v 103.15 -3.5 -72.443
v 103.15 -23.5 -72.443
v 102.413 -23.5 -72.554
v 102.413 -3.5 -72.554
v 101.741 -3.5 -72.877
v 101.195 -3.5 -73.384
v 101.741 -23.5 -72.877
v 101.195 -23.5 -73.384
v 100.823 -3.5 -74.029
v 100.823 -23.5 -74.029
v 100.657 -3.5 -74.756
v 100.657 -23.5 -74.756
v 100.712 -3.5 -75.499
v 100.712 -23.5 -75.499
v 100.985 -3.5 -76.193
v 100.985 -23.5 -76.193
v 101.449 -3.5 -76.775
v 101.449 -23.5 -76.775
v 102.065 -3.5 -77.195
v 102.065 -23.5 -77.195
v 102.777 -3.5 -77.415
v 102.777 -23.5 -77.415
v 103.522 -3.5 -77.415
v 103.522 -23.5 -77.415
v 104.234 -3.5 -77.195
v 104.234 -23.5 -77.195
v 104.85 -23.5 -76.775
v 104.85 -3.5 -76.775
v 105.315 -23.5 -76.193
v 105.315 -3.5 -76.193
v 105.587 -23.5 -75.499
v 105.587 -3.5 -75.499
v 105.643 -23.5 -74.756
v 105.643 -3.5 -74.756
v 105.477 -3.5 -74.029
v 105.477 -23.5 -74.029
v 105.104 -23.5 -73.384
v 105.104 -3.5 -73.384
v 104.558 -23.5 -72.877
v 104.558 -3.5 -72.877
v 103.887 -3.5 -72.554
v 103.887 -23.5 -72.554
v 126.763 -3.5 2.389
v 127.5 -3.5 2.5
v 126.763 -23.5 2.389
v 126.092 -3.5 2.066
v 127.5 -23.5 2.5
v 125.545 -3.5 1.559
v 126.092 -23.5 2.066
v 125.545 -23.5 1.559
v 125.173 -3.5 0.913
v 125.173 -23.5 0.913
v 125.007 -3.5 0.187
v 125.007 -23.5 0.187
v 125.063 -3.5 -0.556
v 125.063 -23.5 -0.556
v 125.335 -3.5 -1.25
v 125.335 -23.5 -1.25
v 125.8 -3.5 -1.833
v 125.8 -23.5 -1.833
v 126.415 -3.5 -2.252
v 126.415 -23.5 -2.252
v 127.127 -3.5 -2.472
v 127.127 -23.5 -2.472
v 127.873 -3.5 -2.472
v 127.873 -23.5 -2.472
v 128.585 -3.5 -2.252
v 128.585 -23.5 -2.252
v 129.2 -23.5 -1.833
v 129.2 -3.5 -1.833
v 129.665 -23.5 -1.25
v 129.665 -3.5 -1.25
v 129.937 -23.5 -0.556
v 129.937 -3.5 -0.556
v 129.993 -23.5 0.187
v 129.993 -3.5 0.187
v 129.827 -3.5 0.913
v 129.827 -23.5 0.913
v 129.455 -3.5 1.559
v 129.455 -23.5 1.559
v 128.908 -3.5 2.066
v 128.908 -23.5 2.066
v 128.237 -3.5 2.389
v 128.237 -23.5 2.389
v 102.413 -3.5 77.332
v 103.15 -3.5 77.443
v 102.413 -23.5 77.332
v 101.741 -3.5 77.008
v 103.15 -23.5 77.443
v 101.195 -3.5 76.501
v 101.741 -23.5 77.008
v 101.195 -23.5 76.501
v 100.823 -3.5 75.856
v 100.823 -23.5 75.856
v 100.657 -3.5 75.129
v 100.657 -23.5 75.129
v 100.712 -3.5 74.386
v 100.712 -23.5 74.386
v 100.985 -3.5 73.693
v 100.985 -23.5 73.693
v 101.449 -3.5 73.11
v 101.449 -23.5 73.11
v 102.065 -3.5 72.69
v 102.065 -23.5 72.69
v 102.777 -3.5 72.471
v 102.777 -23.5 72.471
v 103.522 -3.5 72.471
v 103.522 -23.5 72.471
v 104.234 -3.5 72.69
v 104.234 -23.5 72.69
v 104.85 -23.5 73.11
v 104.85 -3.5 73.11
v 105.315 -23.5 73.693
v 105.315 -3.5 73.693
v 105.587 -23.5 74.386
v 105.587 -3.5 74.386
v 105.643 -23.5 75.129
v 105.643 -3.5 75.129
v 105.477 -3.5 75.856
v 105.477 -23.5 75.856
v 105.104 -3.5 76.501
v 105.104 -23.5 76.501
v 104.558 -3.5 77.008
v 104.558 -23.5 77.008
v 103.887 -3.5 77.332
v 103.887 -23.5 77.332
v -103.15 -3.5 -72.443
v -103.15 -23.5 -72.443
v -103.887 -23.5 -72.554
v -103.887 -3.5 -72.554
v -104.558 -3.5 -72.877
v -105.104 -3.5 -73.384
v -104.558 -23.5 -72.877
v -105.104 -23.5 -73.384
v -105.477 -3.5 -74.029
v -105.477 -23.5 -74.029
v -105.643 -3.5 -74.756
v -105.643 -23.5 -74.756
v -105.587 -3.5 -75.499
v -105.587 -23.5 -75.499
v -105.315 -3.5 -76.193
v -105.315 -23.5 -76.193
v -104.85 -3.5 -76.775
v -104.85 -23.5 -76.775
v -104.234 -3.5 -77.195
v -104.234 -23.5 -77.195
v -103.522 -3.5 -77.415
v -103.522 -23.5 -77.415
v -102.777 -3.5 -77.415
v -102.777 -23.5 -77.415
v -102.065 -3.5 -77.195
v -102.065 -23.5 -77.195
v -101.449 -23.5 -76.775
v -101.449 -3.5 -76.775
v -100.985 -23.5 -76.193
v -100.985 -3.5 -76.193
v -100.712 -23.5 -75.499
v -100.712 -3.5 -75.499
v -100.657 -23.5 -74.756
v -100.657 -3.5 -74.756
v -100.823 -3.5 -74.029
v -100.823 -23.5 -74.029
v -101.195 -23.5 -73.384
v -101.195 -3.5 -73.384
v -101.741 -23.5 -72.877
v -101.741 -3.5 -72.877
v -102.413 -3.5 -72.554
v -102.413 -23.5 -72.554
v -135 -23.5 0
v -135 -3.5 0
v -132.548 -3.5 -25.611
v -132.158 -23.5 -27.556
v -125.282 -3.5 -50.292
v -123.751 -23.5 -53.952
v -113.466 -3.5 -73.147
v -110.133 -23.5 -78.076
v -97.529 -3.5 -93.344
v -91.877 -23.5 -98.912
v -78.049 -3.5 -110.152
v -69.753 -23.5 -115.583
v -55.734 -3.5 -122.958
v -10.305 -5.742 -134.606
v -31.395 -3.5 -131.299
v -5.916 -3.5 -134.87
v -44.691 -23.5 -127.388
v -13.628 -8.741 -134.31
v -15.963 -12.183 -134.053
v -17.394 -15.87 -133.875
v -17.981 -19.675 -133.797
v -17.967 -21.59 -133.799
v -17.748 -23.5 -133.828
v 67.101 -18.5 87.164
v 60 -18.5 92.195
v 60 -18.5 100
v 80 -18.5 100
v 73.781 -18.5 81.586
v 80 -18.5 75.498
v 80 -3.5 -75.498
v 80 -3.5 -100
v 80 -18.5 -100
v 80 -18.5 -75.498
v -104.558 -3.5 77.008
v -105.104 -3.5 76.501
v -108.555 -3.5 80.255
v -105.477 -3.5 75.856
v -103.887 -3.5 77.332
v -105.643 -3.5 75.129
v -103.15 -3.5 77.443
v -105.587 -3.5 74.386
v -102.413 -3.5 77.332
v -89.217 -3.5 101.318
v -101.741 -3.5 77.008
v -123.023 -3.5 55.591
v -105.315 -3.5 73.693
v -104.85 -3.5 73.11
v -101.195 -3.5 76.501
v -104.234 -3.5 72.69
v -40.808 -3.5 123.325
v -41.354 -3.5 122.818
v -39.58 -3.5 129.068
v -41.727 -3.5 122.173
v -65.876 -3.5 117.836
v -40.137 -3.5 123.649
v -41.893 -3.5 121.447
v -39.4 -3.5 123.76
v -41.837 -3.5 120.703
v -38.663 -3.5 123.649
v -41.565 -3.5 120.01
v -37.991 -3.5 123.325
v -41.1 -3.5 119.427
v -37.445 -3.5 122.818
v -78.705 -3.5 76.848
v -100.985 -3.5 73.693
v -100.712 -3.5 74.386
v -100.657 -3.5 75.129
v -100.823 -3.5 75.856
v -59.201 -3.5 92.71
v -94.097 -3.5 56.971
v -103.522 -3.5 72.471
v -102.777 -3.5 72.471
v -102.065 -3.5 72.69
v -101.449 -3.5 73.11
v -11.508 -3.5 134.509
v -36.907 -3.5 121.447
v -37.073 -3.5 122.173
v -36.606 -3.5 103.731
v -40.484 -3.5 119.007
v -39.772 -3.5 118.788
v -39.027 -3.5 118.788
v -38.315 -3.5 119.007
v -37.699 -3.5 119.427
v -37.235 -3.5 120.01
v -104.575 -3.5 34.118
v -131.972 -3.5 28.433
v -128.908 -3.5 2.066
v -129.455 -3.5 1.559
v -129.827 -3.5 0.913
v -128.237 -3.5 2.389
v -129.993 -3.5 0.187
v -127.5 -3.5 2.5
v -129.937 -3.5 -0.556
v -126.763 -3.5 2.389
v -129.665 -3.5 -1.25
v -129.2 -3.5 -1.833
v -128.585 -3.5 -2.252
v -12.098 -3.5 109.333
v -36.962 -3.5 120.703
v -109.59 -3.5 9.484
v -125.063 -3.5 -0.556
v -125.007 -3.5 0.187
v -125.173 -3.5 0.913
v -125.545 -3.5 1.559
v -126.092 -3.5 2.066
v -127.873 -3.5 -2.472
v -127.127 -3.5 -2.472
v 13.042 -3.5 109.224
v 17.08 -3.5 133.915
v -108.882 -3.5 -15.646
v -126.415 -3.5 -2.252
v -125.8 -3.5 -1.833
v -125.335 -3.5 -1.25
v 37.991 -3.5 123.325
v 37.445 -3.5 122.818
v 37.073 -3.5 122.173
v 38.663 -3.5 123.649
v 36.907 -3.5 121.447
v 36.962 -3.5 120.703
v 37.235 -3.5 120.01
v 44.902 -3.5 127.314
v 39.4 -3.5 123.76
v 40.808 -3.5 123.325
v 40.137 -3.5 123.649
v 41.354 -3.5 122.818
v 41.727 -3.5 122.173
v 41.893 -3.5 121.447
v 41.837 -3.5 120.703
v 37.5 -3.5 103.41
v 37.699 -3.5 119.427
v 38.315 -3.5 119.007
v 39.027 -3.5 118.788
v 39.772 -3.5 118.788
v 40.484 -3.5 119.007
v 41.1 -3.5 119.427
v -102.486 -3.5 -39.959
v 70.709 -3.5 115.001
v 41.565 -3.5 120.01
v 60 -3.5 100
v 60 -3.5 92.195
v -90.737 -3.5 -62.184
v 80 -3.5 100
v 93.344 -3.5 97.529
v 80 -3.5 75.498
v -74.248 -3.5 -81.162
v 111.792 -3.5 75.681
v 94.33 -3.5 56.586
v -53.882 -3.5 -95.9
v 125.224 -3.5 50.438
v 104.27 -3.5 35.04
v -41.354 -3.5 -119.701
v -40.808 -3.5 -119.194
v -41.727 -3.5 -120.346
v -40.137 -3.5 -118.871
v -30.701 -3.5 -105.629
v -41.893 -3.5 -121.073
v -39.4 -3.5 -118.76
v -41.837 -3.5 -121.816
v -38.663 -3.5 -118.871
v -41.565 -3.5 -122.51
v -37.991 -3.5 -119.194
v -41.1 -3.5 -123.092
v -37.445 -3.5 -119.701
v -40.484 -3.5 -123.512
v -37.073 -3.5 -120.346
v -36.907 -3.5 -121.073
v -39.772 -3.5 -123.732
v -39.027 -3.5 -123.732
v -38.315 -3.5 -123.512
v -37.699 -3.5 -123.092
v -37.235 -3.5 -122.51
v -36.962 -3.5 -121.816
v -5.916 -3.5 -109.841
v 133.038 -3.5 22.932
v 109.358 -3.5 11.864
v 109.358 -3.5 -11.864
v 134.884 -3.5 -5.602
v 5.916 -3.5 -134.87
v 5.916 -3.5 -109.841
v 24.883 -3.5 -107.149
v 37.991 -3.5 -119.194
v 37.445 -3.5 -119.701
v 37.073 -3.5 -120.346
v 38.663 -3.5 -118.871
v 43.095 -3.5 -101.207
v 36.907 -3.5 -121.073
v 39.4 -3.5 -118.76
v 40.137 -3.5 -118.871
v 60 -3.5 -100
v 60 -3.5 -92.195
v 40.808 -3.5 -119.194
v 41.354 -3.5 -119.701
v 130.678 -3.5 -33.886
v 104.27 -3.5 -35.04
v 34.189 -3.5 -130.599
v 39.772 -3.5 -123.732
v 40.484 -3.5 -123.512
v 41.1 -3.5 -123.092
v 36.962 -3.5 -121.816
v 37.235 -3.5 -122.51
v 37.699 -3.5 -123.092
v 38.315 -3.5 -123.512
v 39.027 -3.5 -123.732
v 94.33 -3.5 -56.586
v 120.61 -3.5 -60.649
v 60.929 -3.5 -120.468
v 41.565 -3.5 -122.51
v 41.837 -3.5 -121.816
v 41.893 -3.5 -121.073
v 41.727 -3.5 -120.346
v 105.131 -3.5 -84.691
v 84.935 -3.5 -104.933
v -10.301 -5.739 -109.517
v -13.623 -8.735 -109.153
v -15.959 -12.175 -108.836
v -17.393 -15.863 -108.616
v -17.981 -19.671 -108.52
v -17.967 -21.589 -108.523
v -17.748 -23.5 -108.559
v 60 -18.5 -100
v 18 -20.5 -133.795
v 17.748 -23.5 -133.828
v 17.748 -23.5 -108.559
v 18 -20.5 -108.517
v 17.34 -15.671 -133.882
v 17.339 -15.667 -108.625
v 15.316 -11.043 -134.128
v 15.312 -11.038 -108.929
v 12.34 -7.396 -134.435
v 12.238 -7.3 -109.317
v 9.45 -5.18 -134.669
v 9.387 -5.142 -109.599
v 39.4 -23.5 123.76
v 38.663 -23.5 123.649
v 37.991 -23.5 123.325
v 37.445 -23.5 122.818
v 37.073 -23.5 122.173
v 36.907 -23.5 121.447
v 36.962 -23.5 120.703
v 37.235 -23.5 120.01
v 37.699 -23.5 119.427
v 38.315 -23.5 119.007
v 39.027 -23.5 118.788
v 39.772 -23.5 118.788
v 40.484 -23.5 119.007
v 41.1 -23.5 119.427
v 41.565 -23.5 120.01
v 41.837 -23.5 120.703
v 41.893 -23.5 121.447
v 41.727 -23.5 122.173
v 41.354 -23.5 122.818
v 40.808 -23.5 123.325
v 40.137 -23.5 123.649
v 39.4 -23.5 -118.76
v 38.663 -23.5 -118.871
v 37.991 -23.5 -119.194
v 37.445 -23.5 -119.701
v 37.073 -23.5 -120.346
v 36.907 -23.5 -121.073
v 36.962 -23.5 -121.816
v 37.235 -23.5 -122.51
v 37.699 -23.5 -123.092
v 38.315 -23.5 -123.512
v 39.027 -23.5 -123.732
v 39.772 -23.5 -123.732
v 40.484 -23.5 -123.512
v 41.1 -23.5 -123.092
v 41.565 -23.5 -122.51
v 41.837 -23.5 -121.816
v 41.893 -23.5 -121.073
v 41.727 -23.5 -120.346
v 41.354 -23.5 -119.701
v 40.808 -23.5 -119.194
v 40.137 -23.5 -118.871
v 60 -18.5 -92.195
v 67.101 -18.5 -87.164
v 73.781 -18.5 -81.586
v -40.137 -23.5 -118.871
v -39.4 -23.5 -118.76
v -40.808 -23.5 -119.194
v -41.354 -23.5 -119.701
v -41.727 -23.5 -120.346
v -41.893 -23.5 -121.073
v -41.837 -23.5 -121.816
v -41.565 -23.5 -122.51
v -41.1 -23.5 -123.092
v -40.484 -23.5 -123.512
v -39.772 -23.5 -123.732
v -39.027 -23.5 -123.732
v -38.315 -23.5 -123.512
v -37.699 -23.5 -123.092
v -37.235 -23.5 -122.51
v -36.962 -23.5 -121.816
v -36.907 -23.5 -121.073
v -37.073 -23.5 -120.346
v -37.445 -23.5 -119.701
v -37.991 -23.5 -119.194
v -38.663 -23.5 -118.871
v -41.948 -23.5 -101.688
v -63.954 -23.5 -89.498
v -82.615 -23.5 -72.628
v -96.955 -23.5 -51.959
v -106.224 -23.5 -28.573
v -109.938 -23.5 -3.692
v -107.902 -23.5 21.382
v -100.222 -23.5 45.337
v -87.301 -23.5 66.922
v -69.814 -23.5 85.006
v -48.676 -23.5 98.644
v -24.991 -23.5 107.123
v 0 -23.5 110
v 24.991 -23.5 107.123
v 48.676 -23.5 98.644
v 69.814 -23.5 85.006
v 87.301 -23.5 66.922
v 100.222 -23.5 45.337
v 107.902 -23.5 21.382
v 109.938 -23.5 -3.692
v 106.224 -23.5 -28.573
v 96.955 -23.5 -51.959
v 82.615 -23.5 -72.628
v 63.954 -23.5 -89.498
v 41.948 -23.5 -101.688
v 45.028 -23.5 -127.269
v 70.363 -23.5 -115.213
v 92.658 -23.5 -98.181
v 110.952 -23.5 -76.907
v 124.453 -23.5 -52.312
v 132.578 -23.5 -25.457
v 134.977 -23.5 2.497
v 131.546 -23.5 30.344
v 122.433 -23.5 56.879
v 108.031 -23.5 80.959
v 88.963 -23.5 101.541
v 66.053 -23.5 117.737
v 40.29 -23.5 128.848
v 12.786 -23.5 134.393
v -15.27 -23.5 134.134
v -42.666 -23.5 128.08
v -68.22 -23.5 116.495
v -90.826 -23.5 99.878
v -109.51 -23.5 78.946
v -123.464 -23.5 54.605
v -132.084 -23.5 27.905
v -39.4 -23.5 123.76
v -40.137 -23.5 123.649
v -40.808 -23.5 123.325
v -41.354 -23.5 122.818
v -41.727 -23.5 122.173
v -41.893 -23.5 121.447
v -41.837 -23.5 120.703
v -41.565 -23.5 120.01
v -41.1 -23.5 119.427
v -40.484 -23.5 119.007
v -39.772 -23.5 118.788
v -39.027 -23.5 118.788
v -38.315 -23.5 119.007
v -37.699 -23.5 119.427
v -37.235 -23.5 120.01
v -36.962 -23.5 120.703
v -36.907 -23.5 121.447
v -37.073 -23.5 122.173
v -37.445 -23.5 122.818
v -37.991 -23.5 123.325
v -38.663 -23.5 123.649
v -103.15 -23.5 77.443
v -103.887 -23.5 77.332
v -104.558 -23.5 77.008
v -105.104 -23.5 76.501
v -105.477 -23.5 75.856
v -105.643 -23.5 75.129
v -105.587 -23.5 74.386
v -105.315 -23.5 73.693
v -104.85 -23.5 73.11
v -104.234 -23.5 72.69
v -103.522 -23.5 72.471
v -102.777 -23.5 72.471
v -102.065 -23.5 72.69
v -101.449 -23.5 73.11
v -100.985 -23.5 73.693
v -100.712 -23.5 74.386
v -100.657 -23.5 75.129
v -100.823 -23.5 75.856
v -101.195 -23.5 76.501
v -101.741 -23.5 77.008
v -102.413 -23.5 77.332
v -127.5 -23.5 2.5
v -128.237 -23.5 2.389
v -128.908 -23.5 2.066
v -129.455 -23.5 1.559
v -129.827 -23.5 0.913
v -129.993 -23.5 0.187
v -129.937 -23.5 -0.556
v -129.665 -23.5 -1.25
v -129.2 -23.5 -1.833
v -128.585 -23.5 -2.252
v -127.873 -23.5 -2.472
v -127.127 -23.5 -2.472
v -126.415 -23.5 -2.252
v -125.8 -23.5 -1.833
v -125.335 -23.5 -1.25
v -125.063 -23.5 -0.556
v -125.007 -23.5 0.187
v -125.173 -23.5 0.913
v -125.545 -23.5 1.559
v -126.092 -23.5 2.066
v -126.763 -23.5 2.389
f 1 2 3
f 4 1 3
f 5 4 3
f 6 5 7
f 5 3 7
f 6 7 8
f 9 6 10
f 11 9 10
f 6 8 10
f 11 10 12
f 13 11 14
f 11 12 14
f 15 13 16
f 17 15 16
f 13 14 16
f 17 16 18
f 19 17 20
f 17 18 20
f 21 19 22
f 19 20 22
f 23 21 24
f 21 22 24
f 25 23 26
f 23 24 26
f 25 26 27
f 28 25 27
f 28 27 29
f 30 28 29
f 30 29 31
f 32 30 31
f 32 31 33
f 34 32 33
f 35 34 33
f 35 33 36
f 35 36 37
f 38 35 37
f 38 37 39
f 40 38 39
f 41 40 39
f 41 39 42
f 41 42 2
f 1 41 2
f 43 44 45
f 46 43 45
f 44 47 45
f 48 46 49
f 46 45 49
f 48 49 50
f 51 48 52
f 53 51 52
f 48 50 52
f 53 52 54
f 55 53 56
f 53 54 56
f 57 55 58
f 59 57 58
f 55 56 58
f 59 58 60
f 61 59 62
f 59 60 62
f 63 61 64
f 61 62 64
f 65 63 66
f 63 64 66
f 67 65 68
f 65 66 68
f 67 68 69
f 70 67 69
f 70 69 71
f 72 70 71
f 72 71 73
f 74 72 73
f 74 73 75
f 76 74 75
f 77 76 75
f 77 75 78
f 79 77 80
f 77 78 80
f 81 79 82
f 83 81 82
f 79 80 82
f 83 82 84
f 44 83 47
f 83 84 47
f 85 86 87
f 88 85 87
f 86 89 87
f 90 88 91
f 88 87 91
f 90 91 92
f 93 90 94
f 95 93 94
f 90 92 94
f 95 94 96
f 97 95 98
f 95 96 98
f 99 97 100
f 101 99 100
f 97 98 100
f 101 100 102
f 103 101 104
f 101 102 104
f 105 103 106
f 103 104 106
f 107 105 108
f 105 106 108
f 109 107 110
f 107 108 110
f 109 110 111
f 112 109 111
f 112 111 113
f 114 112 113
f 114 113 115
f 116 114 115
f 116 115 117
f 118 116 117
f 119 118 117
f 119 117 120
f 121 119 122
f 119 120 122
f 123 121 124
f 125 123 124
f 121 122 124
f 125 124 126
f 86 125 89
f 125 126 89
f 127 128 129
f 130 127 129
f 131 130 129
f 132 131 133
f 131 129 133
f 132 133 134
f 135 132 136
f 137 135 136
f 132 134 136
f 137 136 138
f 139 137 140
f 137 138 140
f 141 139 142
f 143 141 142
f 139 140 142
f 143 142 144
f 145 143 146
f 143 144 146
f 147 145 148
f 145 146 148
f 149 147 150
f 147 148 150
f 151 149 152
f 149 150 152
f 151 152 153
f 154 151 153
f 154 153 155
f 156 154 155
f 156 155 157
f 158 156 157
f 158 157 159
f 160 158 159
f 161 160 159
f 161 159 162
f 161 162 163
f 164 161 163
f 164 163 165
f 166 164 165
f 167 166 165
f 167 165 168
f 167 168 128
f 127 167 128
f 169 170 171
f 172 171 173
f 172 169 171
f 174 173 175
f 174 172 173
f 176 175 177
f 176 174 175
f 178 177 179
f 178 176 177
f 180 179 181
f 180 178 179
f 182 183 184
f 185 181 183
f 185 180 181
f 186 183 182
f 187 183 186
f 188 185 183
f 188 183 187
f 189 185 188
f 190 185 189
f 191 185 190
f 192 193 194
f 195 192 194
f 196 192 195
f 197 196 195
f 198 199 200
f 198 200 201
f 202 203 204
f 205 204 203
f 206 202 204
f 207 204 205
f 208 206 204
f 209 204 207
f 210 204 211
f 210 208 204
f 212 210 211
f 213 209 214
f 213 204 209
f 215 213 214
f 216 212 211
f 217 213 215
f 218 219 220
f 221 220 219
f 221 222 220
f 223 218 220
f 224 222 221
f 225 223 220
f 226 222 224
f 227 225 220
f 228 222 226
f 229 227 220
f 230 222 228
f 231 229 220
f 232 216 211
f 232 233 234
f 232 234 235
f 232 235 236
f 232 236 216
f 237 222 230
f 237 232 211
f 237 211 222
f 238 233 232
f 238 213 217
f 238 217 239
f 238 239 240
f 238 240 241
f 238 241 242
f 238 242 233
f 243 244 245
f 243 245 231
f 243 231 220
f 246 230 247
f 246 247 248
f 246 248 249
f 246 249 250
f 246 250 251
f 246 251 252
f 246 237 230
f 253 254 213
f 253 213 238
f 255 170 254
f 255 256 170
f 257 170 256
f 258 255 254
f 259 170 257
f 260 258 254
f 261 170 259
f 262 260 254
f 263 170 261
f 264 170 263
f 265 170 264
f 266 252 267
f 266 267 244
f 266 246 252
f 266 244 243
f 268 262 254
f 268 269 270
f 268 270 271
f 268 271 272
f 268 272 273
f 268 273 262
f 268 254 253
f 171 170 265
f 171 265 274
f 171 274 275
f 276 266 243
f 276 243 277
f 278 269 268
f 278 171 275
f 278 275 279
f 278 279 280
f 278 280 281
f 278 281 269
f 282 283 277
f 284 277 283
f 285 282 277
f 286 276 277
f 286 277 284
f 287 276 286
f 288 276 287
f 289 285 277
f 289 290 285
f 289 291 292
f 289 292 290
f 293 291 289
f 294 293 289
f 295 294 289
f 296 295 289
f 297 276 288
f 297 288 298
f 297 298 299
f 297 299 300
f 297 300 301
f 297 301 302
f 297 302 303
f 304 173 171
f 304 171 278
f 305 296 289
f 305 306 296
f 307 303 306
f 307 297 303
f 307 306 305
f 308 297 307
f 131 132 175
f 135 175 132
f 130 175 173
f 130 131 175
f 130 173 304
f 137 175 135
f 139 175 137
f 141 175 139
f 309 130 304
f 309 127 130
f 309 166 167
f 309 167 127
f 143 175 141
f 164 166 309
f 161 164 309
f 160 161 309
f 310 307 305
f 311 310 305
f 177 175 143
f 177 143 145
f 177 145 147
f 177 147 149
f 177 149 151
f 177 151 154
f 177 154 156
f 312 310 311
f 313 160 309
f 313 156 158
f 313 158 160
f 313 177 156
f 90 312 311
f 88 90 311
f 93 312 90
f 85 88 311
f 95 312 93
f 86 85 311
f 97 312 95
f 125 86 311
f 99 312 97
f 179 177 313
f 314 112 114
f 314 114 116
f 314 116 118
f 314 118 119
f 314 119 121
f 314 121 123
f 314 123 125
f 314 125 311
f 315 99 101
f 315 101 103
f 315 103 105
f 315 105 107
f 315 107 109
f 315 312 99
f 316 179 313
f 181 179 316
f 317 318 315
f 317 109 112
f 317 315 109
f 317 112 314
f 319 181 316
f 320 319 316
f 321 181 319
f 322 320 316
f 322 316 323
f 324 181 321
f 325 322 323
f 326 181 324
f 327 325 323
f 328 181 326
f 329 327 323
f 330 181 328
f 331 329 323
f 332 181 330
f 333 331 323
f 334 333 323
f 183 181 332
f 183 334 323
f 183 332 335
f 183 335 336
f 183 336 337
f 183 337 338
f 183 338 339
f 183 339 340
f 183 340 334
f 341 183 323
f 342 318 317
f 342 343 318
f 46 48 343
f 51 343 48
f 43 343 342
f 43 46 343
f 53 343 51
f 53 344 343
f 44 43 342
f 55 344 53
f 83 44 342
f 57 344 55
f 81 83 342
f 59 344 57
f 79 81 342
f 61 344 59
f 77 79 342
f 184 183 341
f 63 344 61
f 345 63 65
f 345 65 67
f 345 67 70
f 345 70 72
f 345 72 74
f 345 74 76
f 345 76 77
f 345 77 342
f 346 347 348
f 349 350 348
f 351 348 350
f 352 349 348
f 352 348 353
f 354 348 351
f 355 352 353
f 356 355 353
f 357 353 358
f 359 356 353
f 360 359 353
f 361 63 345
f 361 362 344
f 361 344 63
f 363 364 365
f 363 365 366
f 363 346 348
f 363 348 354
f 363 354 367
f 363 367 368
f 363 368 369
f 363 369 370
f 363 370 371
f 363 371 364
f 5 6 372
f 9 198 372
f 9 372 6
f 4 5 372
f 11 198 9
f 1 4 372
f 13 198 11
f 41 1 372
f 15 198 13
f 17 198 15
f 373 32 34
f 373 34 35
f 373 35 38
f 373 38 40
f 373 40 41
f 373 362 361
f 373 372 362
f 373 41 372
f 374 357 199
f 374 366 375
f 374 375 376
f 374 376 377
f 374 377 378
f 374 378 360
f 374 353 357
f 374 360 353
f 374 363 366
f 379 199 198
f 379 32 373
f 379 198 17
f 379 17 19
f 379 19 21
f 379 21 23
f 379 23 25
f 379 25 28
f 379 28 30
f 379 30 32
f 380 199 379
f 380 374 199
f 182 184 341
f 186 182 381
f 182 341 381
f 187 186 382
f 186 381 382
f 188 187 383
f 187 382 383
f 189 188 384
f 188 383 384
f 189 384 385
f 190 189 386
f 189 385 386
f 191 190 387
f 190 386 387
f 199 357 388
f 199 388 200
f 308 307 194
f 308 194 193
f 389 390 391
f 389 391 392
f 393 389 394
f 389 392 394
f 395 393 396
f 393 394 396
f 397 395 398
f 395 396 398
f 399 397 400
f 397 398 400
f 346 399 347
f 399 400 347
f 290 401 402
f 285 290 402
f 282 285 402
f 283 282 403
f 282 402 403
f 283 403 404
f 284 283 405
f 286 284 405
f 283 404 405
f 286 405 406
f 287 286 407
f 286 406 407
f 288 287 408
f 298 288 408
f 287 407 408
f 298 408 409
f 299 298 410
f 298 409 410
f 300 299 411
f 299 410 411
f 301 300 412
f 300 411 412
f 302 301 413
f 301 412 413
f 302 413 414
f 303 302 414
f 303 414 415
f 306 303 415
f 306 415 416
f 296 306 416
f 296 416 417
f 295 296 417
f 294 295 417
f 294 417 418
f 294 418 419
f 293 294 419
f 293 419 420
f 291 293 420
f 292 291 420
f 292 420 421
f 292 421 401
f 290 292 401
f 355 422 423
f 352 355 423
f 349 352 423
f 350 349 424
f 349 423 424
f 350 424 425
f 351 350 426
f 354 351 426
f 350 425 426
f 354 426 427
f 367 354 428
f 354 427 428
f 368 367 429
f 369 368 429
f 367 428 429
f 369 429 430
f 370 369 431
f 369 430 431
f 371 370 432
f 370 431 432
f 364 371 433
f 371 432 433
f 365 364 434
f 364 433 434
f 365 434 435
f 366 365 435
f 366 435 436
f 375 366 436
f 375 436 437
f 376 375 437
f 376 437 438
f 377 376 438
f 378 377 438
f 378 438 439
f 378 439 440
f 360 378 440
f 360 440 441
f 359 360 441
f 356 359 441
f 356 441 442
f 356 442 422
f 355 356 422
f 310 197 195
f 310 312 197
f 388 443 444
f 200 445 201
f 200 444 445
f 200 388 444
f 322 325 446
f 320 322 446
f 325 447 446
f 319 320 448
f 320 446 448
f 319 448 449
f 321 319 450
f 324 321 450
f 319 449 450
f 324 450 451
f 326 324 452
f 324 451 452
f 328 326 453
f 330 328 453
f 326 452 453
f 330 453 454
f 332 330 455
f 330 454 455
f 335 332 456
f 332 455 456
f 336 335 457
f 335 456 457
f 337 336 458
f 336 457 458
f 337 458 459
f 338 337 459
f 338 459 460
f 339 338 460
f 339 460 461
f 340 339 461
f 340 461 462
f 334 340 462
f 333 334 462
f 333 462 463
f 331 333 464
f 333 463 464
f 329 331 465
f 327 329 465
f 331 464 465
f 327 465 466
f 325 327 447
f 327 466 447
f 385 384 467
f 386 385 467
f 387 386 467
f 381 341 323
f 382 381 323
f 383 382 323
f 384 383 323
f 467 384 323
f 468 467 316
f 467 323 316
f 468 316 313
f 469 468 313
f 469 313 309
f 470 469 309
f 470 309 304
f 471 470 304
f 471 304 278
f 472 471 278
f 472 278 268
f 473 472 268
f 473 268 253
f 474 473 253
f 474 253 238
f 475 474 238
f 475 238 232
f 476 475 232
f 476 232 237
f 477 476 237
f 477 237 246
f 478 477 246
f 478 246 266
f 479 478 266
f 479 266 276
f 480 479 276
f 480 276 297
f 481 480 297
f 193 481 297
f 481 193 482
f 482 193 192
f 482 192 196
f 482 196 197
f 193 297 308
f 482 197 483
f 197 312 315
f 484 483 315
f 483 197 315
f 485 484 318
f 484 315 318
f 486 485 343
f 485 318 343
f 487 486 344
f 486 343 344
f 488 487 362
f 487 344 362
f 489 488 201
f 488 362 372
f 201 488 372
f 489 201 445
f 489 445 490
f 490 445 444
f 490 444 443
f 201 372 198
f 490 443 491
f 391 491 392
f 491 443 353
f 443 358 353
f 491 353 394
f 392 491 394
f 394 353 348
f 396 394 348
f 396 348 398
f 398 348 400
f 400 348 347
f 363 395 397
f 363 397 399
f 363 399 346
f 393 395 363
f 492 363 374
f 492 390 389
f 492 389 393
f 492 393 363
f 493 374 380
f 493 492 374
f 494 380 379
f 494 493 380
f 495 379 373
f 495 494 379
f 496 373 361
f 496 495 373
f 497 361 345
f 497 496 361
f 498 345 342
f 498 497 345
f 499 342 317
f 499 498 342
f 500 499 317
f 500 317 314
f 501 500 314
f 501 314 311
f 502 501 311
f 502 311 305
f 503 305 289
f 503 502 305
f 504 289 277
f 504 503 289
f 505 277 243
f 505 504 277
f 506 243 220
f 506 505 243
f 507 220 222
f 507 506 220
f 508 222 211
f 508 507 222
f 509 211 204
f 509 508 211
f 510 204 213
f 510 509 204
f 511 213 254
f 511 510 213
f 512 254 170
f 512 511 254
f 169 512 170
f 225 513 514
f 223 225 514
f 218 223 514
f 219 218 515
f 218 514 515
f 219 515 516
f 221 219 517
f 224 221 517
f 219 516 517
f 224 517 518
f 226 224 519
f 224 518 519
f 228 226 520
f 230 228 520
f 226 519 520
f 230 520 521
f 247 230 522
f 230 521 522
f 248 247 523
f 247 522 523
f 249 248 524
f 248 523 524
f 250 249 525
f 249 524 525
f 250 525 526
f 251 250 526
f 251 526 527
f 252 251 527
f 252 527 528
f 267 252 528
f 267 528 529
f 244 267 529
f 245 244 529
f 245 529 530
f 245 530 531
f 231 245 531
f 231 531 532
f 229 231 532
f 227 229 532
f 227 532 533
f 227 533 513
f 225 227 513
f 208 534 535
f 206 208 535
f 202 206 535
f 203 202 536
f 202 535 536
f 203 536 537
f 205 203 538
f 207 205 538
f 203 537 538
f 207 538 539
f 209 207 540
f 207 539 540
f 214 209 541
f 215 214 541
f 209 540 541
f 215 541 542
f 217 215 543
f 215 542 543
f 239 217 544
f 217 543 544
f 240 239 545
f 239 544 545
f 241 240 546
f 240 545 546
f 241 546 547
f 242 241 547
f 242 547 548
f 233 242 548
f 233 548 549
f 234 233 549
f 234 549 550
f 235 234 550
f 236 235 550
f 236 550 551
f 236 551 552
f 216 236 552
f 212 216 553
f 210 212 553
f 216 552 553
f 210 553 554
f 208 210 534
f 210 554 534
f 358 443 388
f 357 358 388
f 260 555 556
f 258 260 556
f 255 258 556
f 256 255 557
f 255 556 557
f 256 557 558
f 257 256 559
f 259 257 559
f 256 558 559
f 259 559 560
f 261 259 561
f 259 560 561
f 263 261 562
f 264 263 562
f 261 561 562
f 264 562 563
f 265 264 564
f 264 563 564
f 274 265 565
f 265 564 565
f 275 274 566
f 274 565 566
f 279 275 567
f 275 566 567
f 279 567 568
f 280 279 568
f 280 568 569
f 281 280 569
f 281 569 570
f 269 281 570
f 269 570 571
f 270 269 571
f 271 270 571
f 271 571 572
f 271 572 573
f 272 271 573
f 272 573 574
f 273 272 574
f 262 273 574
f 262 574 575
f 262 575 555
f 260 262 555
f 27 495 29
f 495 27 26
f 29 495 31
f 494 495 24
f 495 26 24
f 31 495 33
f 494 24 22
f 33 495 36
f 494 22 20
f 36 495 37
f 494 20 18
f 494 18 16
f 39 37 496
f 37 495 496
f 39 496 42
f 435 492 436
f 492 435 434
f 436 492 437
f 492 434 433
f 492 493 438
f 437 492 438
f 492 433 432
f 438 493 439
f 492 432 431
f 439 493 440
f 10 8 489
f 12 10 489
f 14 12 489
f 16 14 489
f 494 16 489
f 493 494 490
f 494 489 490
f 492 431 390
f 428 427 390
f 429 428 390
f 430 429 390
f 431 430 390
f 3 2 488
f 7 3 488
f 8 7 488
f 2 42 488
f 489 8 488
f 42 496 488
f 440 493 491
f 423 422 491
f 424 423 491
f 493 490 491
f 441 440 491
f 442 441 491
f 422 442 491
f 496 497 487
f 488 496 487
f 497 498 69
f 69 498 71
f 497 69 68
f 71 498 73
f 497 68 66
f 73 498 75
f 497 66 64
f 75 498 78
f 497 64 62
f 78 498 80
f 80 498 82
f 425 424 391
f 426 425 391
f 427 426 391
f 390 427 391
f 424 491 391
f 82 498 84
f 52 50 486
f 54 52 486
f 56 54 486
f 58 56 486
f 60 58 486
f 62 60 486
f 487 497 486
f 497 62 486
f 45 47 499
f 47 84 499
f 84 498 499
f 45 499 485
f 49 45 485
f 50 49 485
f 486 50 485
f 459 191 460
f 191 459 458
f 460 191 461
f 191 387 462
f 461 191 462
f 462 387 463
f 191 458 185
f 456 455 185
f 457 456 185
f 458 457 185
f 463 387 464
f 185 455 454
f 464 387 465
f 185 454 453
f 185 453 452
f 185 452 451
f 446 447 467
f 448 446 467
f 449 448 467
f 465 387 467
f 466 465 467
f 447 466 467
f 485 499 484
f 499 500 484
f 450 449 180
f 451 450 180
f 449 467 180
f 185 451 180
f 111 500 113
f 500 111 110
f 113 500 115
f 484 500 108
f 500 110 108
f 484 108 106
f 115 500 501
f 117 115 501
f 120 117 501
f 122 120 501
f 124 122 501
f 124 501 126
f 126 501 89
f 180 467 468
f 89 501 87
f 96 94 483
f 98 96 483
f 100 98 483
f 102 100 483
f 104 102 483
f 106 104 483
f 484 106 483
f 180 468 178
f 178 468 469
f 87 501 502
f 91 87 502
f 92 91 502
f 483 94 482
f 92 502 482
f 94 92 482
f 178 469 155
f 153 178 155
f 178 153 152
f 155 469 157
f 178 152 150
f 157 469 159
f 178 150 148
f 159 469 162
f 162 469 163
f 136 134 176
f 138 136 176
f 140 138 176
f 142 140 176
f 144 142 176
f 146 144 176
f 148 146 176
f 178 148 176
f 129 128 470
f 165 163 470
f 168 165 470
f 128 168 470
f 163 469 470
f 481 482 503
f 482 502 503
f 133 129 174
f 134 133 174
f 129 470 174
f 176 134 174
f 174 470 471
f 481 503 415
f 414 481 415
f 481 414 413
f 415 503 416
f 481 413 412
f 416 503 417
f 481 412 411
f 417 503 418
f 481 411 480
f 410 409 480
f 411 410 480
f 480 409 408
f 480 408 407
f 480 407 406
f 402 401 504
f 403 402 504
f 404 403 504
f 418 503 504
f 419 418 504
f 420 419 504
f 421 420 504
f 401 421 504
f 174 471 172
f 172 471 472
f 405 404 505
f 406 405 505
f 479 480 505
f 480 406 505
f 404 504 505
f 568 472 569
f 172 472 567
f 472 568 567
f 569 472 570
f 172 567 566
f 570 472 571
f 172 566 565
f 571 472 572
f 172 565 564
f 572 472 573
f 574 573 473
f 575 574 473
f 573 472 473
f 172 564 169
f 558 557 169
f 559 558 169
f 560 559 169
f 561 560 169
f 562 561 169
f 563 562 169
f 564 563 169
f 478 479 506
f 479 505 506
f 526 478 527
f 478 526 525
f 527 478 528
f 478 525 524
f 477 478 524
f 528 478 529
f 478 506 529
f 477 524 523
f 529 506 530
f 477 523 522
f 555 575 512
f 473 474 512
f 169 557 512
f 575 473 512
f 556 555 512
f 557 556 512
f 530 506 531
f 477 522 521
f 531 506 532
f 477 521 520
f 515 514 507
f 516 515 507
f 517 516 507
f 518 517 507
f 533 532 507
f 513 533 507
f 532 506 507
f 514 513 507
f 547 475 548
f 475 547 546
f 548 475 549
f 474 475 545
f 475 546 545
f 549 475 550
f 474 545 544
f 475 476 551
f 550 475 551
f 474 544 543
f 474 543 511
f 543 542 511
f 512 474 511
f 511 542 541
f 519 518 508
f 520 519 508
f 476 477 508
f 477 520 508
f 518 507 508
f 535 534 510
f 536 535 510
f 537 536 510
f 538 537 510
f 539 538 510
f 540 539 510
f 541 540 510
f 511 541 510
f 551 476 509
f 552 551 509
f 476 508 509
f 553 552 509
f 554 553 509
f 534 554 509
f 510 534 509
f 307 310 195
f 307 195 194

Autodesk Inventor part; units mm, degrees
ref_plane "YZ Plane" through (0, 0, 0) normal (1, 0, 0) x (0, 1, 0)
ref_plane "XZ Plane" through (0, 0, 0) normal (0, 1, 0) x (-1, 0, 0)
ref_plane "XY Plane" through (0, 0, 0) normal (0, 0, 1) x (1, 0, 0)
sketch "Sketch1" plane through (0, 0, 0) normal (0, 1, 0) x (-1, 0, 0)
  circle A0 centre (0, 0) radius 135
  circle A1 centre (0, 0) radius 110
  dimension "d0" = 270
  dimension "d1" = 220
extrude "Extrusion1" add sketch "Sketch1" along normal mid plane 47
sketch "Sketch2" plane through (0, 0, 0) normal (0, 0, 1) x (1, 0, 0)
  circle A0 centre (0, -20.5) radius 18
  line L0 (-135, -23.5) -> (135, -23.5) projected
  dimension "d4" = 36
  dimension "d38" = 3
extrude "Extrusion2" cut sketch "Sketch2" against normal through all
sketch "Sketch3" plane through (0, 23.5, 0) normal (0, 1, 0) x (1, 0, 0)
  circle A0 centre (0, 0) radius 127.5
  circle A1 centre (-127.5, 0) radius 2
  circle A2 centre (-103.1497, -74.9426) radius 2
  circle A3 centre (-39.3997, -121.2597) radius 2
  circle A4 centre (39.3997, -121.2597) radius 2
  circle A5 centre (103.1497, -74.9426) radius 2
  circle A6 centre (127.5, 0) radius 2
  circle A7 centre (103.1497, 74.9426) radius 2
  circle A8 centre (39.3997, 121.2597) radius 2
  circle A9 centre (-39.3997, 121.2597) radius 2
  circle A10 centre (-103.1497, 74.9426) radius 2
  dimension "d7" = 255
  dimension "d8" = 4
  dimension "d11" = 360
hole "Hole1" at (39.3997, 23.5, 121.2597) at (-39.3997, 23.5, 121.2597) at (-103.1497, 23.5, 74.9426) at (-127.5, 23.5, 0) at (-103.1497, 23.5, -74.9426) at (-39.3997, 23.5, -121.2597) at (39.3997, 23.5, -121.2597) at (103.1497, 23.5, -74.9426) at (127.5, 23.5, 0) at (103.1497, 23.5, 74.9426) direction (0, -1, 0) diameter 5 end through all
sketch "Sketch4" plane through (0, 23.5, 0) normal (0, 1, 0) x (1, 0, 0)
  circle A0 centre (0, 0) radius 140
extrude "Extrusion3" cut sketch "Sketch4" against normal blind 27
sketch "Sketch7" plane through (0, -3.5, 0) normal (0, 1, 0) x (1, 0, 0)
  line L0 (0, 0) -> (70, 0)
  line L1 (80, -100) -> (60, -100)
  line L2 (60, -100) -> (60, 100)
  line L3 (60, 100) -> (80, 100)
  line L4 (80, 100) -> (80, -100)
  line L5 (80, -100) -> (60, 100) construction
  line L6 (60, -100) -> (80, 100) construction
  dimension "d39" = 70
  dimension "d40" = 20
  dimension "d41" = 200
extrude "Extrusion7" cut sketch "Sketch7" against normal blind 15
properties part number "Cylinder Spacer Bottom"
